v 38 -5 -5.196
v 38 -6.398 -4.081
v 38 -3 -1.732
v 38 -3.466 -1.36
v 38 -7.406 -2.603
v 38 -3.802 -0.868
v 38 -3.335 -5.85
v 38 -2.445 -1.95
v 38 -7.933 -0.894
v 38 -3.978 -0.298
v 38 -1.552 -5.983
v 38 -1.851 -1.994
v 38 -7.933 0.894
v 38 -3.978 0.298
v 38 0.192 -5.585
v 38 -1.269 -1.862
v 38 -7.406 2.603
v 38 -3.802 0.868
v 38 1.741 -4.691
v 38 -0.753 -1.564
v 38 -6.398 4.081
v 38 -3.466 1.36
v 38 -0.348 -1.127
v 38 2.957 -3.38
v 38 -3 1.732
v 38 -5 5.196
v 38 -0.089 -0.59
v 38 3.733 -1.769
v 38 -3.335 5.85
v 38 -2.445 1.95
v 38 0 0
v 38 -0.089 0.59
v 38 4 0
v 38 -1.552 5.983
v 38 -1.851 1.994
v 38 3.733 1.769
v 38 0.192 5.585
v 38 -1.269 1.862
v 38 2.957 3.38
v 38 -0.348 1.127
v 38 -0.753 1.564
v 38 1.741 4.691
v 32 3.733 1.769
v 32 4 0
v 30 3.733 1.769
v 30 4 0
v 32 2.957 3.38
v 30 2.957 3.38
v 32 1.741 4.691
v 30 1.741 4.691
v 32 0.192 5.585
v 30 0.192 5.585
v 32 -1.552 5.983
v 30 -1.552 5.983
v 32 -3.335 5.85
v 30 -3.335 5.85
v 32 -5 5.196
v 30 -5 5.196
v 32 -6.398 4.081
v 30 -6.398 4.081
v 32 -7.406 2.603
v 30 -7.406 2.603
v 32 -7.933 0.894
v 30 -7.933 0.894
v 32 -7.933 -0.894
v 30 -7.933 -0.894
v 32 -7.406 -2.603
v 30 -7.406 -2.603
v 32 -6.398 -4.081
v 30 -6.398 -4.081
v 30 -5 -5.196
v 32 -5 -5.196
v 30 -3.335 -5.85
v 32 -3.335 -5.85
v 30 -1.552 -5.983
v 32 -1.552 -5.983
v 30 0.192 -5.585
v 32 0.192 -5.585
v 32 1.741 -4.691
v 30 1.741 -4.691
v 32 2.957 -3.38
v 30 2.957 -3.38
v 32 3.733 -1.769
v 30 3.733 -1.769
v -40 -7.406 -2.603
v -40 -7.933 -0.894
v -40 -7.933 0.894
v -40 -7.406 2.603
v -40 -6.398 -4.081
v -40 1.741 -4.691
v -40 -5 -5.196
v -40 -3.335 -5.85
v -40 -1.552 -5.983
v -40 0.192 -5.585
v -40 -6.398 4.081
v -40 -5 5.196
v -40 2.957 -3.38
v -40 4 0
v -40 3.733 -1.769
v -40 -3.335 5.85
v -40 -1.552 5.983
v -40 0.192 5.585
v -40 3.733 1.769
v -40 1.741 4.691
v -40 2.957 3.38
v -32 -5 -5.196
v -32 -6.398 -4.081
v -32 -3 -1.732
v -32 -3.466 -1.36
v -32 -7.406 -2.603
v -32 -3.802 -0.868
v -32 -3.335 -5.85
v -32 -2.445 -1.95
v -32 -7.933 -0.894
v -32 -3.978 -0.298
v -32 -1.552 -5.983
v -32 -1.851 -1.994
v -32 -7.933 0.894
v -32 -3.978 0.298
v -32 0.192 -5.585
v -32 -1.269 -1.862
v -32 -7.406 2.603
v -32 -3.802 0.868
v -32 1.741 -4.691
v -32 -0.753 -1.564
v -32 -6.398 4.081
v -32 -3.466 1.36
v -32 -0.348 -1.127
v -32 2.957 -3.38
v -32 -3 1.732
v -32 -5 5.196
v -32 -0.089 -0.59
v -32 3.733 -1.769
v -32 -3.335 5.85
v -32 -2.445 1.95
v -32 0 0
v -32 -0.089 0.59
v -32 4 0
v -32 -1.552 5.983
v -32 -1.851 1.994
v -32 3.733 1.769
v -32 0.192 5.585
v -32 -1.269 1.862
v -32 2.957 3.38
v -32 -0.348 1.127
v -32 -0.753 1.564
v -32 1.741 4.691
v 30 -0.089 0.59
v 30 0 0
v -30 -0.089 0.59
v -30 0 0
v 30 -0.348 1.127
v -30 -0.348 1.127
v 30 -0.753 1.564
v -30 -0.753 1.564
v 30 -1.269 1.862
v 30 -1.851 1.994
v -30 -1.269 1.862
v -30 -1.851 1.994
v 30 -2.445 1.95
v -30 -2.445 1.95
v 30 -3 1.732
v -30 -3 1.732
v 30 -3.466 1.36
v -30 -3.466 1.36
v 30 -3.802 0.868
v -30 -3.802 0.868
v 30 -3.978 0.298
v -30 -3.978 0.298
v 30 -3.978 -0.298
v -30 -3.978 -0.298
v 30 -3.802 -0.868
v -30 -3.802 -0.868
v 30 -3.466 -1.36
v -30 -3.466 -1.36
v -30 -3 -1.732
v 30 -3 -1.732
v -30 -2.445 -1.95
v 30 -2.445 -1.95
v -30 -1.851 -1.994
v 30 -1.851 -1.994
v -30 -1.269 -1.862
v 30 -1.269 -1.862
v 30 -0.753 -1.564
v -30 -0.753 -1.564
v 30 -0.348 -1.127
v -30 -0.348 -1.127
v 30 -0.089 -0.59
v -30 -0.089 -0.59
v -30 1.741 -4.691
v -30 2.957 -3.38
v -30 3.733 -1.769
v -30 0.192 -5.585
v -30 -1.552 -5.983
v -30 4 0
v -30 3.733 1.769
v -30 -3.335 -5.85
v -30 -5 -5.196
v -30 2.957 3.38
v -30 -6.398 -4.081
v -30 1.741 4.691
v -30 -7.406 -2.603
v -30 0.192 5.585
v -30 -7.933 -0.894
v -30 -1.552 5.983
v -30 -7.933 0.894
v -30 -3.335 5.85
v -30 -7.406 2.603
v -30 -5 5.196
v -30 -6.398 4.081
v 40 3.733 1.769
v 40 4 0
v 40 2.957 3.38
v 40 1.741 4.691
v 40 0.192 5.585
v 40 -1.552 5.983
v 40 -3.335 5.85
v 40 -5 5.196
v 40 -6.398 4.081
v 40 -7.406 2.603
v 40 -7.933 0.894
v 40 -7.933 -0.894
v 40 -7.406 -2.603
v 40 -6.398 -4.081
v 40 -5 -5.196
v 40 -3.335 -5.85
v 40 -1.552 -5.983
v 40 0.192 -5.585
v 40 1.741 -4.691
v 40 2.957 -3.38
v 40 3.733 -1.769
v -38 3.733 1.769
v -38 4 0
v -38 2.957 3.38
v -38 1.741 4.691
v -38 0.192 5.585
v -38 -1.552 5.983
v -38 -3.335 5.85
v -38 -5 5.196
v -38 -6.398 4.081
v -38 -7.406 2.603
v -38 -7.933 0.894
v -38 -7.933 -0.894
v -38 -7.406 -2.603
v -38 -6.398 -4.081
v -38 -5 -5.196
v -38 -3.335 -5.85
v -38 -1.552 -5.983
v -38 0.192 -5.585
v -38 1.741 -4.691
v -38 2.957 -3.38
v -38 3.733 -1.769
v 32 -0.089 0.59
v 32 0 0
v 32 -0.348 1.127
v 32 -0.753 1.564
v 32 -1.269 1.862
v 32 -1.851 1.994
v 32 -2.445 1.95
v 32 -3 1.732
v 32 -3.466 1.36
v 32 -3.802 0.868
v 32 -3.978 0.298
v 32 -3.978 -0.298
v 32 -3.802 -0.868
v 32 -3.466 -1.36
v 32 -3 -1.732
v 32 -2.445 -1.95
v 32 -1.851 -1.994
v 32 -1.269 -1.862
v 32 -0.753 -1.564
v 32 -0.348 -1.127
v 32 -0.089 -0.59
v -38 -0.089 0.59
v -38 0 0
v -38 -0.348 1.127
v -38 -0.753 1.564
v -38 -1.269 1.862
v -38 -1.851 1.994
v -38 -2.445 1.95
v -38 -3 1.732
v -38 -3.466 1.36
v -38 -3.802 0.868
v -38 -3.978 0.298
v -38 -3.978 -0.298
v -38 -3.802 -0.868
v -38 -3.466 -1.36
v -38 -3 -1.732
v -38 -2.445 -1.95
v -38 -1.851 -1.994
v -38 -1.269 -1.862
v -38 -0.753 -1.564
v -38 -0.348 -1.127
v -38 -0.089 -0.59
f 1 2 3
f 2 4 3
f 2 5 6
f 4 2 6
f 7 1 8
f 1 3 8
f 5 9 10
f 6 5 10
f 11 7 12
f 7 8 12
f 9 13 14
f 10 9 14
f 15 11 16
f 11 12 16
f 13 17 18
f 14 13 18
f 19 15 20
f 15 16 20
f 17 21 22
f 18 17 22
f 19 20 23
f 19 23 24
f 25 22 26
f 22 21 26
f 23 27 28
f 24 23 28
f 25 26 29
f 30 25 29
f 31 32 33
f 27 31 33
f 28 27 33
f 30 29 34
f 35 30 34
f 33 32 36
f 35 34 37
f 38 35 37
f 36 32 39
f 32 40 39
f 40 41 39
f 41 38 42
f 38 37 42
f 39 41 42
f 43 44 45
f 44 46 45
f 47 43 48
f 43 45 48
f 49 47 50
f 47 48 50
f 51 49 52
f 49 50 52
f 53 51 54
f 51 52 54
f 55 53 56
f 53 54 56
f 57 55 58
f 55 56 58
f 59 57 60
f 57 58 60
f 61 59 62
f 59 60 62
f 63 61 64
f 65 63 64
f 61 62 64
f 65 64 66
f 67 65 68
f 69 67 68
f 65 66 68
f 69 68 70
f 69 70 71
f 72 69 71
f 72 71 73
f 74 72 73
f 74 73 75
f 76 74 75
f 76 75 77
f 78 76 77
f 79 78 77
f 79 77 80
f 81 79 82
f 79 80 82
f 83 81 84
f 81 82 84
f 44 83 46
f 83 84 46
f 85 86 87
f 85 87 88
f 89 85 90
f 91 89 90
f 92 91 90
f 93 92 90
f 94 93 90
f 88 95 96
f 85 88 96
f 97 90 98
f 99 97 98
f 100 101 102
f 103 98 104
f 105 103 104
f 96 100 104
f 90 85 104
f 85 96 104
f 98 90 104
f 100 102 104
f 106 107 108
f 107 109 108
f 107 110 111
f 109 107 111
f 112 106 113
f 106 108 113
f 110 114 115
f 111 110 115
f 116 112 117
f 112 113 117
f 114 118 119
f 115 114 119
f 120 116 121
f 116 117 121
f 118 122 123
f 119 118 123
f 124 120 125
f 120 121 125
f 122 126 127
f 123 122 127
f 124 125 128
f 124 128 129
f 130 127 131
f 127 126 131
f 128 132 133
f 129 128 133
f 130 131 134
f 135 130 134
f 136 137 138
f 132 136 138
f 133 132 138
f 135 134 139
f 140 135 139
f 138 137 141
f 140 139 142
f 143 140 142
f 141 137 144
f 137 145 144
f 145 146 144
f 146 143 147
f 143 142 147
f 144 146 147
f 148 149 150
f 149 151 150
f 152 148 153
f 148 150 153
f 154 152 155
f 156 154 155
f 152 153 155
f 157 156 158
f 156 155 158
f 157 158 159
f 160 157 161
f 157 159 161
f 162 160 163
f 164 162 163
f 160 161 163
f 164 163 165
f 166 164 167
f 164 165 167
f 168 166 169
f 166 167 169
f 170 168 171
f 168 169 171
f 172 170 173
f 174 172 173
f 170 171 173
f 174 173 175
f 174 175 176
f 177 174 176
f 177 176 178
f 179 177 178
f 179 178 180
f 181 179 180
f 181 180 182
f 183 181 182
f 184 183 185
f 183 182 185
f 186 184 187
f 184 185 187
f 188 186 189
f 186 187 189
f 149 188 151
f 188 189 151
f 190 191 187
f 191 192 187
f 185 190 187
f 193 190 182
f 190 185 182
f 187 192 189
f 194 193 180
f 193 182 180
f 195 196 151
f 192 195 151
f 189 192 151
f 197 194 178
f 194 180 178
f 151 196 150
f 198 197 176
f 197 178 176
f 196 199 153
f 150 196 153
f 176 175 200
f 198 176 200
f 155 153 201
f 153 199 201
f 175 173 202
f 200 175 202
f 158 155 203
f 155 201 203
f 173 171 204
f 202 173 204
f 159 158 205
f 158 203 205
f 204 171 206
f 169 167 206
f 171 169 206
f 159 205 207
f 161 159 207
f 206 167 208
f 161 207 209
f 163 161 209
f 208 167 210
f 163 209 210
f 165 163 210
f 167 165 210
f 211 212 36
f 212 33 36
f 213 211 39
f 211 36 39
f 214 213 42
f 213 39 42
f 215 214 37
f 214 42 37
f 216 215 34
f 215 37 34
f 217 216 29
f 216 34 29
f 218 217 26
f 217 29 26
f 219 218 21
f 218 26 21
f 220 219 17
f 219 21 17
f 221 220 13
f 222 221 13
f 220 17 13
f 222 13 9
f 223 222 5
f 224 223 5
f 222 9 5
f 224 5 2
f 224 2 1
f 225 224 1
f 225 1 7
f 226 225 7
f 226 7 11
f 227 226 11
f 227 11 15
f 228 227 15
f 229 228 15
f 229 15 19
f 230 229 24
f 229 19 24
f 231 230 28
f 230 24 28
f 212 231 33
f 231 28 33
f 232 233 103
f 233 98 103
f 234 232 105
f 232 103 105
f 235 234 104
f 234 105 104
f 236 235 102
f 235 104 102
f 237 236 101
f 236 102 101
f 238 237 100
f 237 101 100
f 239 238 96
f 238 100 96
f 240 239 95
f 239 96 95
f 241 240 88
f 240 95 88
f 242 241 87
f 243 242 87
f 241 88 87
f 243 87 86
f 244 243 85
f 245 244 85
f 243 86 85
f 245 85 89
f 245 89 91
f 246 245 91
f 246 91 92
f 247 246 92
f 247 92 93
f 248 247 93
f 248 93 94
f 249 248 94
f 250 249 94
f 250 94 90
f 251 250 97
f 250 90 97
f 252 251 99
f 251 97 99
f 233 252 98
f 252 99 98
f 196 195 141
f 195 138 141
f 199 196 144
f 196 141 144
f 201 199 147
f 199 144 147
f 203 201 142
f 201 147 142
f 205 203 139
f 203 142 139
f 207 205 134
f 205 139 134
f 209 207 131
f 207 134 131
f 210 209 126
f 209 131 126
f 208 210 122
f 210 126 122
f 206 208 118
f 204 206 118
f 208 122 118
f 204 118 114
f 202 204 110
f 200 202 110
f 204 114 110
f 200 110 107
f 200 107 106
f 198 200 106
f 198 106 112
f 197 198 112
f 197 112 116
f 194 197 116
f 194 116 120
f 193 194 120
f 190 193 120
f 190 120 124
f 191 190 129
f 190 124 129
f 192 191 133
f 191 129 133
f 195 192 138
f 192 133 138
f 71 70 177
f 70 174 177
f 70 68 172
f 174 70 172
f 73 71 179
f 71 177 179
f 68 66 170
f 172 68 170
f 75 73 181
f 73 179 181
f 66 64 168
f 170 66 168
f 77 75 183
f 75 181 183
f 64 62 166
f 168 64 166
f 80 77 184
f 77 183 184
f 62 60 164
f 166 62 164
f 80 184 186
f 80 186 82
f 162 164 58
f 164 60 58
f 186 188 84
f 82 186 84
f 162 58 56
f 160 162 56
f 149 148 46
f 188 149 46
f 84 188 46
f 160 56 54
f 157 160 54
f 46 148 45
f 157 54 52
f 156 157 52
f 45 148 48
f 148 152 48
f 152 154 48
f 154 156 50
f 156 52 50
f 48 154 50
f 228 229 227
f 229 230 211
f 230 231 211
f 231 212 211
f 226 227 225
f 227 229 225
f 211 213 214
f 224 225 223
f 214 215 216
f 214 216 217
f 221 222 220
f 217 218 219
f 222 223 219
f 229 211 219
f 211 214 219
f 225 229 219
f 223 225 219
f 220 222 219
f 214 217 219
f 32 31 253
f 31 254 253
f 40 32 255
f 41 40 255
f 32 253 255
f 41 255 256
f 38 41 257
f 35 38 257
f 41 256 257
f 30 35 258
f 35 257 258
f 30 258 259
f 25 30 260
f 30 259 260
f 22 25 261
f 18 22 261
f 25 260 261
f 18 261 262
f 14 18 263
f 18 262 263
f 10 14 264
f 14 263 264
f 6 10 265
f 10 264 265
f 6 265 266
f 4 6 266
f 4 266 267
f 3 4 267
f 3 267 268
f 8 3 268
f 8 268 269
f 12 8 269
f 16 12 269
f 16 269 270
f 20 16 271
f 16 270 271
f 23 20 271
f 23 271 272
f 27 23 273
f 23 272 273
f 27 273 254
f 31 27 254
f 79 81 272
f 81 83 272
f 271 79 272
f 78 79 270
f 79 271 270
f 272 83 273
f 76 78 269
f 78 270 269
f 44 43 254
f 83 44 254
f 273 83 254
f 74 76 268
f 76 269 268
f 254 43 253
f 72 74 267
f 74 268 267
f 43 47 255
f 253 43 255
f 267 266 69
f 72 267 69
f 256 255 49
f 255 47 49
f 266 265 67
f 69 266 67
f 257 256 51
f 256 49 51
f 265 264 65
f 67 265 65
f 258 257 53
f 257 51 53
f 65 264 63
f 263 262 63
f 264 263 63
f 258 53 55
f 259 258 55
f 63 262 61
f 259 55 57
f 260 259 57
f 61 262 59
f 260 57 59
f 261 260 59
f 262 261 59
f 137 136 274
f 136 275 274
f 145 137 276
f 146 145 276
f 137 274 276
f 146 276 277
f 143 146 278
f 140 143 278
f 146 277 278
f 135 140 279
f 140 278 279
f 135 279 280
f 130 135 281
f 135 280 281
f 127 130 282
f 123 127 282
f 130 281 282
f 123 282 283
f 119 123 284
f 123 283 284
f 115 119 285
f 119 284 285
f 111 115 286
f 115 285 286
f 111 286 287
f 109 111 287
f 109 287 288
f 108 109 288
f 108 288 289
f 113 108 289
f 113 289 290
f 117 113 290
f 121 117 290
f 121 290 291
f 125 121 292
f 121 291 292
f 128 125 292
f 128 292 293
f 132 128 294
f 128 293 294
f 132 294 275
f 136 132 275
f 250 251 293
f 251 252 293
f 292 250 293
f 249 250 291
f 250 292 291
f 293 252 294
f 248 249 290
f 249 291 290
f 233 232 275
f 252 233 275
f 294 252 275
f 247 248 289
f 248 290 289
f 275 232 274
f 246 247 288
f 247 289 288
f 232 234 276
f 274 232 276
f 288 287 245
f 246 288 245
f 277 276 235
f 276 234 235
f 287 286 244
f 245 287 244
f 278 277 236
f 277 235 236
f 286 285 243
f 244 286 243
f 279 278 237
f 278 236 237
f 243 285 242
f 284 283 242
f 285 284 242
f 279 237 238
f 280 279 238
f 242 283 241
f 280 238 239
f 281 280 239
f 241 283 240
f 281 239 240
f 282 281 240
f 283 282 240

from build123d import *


with BuildPart() as part:
    # 草图1 → 旋转1 (revolve)
    with BuildSketch(Plane.XY):
        Polygon((30, 0), (-30, 0), (-30, 4), (-32, 4), (-32, 0), (-38, 0), (-38, 4), (-40, 4), (-40, 0), (-40, -2), (40, -2), (40, 0), (40, 4), (38, 4), (38, 0), (32, 0), (32, 4), (30, 4), align=None)
    revolve(axis=Axis((-40, -2, 0), (1, 0, 0)))


solid = part.part
